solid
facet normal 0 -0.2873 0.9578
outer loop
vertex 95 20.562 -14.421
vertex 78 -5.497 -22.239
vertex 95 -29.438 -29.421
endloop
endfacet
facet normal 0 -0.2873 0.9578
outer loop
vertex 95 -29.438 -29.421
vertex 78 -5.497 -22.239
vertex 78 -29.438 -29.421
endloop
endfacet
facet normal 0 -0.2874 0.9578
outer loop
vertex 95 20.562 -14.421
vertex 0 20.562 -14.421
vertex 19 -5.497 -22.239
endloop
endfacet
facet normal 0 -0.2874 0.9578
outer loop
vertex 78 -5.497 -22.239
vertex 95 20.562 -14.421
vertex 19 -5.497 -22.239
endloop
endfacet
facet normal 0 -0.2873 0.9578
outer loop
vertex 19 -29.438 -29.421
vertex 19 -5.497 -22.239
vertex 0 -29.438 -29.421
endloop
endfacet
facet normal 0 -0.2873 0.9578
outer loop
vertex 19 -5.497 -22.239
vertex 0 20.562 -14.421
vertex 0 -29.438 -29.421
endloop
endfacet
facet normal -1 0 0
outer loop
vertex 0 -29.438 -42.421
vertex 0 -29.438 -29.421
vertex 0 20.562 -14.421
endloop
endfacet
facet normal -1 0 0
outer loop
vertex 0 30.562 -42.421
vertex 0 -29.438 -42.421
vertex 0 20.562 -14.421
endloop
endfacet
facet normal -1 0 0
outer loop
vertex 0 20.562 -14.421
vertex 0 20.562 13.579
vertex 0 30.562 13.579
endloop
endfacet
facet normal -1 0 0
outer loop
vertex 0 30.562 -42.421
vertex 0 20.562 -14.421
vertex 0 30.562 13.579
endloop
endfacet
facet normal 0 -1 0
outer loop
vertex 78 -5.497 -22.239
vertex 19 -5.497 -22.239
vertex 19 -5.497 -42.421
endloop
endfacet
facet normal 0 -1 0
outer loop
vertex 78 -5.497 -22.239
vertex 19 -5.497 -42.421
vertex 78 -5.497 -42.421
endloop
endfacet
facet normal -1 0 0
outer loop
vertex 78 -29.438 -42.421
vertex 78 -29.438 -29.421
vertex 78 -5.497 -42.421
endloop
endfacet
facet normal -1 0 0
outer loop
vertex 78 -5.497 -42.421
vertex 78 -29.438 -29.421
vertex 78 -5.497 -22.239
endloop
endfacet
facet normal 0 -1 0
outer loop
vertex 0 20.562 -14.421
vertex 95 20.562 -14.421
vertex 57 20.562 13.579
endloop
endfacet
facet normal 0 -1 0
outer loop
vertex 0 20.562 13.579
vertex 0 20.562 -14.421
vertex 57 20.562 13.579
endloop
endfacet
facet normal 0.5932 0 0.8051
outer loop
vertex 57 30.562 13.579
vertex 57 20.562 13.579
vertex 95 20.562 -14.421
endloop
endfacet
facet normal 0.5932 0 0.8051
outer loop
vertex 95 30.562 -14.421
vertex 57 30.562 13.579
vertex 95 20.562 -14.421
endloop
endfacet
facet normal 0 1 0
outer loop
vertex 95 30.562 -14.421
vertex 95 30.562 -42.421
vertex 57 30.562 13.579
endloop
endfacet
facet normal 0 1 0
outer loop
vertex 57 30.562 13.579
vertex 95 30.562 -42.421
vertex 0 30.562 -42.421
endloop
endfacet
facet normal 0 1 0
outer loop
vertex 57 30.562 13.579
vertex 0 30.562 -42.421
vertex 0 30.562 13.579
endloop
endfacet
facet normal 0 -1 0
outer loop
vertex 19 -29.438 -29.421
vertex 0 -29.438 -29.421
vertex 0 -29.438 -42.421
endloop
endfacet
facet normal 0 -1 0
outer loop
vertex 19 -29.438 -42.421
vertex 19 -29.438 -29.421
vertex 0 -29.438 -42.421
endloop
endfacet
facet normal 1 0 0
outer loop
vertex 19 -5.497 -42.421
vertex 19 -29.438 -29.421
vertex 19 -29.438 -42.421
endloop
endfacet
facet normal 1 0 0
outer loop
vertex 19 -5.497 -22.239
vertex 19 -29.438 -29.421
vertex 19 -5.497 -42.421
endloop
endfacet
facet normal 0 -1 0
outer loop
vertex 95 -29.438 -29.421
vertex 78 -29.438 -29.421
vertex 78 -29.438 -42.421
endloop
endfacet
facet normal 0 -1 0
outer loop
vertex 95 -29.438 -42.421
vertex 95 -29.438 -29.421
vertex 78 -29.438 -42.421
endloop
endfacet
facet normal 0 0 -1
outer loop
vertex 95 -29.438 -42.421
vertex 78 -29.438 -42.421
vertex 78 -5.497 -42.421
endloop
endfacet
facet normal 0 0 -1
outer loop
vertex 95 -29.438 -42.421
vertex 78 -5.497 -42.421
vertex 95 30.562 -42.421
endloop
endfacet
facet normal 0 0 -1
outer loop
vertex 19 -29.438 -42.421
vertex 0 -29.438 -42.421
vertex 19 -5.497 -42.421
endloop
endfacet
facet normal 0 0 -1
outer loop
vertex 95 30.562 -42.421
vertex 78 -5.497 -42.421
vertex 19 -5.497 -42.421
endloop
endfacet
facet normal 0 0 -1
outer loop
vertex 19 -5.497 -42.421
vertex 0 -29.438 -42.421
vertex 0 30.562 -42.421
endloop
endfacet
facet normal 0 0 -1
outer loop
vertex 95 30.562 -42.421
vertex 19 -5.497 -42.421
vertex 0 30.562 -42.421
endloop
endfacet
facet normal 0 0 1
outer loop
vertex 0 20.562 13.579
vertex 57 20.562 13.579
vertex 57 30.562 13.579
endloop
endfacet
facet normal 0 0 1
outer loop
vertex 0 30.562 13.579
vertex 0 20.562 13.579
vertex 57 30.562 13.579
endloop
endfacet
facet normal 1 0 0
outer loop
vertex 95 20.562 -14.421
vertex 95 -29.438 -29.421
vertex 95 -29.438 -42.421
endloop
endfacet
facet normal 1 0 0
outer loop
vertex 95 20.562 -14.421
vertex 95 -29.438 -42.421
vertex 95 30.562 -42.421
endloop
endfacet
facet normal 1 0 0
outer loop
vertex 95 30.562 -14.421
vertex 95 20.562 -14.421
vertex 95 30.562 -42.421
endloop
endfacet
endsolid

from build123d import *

# Parameters (mm, degrees)
F0_W     = 10
F0_H     = 28
F1_DEPTH = 95
F3_DEPTH = 39.5
F4_W     = 59
F4_H     = 24
F5_DEPTH = 192


with BuildPart() as f1:
    # F0 (on Right) → F1 (new body)
    with BuildSketch(Plane.YZ):
        with Locations((25.561791, -0.421245)):
            Rectangle(F0_W, F0_H)
        Polygon((-29.438209, -29.421245), (-29.438209, -42.421245), (30.561791, -42.421245), (30.561791, -14.421245), (20.561791, -14.421245), align=None)
    extrude(amount=F1_DEPTH)

    # F2 (on face) → F3 (cut)
    with BuildSketch(Plane.XZ.offset(-20.561791)):
        Polygon((95, 13.578755), (57, 13.578755), (95, -14.421245), align=None)
    extrude(amount=-F3_DEPTH, mode=Mode.SUBTRACT)

    # F4 (on Top) → F5 (cut)
    with BuildSketch(Plane.XY):
        with Locations((48.5, -17.497424)):
            Rectangle(F4_W, F4_H)
    extrude(amount=-F5_DEPTH, mode=Mode.SUBTRACT)


solid = f1.part
